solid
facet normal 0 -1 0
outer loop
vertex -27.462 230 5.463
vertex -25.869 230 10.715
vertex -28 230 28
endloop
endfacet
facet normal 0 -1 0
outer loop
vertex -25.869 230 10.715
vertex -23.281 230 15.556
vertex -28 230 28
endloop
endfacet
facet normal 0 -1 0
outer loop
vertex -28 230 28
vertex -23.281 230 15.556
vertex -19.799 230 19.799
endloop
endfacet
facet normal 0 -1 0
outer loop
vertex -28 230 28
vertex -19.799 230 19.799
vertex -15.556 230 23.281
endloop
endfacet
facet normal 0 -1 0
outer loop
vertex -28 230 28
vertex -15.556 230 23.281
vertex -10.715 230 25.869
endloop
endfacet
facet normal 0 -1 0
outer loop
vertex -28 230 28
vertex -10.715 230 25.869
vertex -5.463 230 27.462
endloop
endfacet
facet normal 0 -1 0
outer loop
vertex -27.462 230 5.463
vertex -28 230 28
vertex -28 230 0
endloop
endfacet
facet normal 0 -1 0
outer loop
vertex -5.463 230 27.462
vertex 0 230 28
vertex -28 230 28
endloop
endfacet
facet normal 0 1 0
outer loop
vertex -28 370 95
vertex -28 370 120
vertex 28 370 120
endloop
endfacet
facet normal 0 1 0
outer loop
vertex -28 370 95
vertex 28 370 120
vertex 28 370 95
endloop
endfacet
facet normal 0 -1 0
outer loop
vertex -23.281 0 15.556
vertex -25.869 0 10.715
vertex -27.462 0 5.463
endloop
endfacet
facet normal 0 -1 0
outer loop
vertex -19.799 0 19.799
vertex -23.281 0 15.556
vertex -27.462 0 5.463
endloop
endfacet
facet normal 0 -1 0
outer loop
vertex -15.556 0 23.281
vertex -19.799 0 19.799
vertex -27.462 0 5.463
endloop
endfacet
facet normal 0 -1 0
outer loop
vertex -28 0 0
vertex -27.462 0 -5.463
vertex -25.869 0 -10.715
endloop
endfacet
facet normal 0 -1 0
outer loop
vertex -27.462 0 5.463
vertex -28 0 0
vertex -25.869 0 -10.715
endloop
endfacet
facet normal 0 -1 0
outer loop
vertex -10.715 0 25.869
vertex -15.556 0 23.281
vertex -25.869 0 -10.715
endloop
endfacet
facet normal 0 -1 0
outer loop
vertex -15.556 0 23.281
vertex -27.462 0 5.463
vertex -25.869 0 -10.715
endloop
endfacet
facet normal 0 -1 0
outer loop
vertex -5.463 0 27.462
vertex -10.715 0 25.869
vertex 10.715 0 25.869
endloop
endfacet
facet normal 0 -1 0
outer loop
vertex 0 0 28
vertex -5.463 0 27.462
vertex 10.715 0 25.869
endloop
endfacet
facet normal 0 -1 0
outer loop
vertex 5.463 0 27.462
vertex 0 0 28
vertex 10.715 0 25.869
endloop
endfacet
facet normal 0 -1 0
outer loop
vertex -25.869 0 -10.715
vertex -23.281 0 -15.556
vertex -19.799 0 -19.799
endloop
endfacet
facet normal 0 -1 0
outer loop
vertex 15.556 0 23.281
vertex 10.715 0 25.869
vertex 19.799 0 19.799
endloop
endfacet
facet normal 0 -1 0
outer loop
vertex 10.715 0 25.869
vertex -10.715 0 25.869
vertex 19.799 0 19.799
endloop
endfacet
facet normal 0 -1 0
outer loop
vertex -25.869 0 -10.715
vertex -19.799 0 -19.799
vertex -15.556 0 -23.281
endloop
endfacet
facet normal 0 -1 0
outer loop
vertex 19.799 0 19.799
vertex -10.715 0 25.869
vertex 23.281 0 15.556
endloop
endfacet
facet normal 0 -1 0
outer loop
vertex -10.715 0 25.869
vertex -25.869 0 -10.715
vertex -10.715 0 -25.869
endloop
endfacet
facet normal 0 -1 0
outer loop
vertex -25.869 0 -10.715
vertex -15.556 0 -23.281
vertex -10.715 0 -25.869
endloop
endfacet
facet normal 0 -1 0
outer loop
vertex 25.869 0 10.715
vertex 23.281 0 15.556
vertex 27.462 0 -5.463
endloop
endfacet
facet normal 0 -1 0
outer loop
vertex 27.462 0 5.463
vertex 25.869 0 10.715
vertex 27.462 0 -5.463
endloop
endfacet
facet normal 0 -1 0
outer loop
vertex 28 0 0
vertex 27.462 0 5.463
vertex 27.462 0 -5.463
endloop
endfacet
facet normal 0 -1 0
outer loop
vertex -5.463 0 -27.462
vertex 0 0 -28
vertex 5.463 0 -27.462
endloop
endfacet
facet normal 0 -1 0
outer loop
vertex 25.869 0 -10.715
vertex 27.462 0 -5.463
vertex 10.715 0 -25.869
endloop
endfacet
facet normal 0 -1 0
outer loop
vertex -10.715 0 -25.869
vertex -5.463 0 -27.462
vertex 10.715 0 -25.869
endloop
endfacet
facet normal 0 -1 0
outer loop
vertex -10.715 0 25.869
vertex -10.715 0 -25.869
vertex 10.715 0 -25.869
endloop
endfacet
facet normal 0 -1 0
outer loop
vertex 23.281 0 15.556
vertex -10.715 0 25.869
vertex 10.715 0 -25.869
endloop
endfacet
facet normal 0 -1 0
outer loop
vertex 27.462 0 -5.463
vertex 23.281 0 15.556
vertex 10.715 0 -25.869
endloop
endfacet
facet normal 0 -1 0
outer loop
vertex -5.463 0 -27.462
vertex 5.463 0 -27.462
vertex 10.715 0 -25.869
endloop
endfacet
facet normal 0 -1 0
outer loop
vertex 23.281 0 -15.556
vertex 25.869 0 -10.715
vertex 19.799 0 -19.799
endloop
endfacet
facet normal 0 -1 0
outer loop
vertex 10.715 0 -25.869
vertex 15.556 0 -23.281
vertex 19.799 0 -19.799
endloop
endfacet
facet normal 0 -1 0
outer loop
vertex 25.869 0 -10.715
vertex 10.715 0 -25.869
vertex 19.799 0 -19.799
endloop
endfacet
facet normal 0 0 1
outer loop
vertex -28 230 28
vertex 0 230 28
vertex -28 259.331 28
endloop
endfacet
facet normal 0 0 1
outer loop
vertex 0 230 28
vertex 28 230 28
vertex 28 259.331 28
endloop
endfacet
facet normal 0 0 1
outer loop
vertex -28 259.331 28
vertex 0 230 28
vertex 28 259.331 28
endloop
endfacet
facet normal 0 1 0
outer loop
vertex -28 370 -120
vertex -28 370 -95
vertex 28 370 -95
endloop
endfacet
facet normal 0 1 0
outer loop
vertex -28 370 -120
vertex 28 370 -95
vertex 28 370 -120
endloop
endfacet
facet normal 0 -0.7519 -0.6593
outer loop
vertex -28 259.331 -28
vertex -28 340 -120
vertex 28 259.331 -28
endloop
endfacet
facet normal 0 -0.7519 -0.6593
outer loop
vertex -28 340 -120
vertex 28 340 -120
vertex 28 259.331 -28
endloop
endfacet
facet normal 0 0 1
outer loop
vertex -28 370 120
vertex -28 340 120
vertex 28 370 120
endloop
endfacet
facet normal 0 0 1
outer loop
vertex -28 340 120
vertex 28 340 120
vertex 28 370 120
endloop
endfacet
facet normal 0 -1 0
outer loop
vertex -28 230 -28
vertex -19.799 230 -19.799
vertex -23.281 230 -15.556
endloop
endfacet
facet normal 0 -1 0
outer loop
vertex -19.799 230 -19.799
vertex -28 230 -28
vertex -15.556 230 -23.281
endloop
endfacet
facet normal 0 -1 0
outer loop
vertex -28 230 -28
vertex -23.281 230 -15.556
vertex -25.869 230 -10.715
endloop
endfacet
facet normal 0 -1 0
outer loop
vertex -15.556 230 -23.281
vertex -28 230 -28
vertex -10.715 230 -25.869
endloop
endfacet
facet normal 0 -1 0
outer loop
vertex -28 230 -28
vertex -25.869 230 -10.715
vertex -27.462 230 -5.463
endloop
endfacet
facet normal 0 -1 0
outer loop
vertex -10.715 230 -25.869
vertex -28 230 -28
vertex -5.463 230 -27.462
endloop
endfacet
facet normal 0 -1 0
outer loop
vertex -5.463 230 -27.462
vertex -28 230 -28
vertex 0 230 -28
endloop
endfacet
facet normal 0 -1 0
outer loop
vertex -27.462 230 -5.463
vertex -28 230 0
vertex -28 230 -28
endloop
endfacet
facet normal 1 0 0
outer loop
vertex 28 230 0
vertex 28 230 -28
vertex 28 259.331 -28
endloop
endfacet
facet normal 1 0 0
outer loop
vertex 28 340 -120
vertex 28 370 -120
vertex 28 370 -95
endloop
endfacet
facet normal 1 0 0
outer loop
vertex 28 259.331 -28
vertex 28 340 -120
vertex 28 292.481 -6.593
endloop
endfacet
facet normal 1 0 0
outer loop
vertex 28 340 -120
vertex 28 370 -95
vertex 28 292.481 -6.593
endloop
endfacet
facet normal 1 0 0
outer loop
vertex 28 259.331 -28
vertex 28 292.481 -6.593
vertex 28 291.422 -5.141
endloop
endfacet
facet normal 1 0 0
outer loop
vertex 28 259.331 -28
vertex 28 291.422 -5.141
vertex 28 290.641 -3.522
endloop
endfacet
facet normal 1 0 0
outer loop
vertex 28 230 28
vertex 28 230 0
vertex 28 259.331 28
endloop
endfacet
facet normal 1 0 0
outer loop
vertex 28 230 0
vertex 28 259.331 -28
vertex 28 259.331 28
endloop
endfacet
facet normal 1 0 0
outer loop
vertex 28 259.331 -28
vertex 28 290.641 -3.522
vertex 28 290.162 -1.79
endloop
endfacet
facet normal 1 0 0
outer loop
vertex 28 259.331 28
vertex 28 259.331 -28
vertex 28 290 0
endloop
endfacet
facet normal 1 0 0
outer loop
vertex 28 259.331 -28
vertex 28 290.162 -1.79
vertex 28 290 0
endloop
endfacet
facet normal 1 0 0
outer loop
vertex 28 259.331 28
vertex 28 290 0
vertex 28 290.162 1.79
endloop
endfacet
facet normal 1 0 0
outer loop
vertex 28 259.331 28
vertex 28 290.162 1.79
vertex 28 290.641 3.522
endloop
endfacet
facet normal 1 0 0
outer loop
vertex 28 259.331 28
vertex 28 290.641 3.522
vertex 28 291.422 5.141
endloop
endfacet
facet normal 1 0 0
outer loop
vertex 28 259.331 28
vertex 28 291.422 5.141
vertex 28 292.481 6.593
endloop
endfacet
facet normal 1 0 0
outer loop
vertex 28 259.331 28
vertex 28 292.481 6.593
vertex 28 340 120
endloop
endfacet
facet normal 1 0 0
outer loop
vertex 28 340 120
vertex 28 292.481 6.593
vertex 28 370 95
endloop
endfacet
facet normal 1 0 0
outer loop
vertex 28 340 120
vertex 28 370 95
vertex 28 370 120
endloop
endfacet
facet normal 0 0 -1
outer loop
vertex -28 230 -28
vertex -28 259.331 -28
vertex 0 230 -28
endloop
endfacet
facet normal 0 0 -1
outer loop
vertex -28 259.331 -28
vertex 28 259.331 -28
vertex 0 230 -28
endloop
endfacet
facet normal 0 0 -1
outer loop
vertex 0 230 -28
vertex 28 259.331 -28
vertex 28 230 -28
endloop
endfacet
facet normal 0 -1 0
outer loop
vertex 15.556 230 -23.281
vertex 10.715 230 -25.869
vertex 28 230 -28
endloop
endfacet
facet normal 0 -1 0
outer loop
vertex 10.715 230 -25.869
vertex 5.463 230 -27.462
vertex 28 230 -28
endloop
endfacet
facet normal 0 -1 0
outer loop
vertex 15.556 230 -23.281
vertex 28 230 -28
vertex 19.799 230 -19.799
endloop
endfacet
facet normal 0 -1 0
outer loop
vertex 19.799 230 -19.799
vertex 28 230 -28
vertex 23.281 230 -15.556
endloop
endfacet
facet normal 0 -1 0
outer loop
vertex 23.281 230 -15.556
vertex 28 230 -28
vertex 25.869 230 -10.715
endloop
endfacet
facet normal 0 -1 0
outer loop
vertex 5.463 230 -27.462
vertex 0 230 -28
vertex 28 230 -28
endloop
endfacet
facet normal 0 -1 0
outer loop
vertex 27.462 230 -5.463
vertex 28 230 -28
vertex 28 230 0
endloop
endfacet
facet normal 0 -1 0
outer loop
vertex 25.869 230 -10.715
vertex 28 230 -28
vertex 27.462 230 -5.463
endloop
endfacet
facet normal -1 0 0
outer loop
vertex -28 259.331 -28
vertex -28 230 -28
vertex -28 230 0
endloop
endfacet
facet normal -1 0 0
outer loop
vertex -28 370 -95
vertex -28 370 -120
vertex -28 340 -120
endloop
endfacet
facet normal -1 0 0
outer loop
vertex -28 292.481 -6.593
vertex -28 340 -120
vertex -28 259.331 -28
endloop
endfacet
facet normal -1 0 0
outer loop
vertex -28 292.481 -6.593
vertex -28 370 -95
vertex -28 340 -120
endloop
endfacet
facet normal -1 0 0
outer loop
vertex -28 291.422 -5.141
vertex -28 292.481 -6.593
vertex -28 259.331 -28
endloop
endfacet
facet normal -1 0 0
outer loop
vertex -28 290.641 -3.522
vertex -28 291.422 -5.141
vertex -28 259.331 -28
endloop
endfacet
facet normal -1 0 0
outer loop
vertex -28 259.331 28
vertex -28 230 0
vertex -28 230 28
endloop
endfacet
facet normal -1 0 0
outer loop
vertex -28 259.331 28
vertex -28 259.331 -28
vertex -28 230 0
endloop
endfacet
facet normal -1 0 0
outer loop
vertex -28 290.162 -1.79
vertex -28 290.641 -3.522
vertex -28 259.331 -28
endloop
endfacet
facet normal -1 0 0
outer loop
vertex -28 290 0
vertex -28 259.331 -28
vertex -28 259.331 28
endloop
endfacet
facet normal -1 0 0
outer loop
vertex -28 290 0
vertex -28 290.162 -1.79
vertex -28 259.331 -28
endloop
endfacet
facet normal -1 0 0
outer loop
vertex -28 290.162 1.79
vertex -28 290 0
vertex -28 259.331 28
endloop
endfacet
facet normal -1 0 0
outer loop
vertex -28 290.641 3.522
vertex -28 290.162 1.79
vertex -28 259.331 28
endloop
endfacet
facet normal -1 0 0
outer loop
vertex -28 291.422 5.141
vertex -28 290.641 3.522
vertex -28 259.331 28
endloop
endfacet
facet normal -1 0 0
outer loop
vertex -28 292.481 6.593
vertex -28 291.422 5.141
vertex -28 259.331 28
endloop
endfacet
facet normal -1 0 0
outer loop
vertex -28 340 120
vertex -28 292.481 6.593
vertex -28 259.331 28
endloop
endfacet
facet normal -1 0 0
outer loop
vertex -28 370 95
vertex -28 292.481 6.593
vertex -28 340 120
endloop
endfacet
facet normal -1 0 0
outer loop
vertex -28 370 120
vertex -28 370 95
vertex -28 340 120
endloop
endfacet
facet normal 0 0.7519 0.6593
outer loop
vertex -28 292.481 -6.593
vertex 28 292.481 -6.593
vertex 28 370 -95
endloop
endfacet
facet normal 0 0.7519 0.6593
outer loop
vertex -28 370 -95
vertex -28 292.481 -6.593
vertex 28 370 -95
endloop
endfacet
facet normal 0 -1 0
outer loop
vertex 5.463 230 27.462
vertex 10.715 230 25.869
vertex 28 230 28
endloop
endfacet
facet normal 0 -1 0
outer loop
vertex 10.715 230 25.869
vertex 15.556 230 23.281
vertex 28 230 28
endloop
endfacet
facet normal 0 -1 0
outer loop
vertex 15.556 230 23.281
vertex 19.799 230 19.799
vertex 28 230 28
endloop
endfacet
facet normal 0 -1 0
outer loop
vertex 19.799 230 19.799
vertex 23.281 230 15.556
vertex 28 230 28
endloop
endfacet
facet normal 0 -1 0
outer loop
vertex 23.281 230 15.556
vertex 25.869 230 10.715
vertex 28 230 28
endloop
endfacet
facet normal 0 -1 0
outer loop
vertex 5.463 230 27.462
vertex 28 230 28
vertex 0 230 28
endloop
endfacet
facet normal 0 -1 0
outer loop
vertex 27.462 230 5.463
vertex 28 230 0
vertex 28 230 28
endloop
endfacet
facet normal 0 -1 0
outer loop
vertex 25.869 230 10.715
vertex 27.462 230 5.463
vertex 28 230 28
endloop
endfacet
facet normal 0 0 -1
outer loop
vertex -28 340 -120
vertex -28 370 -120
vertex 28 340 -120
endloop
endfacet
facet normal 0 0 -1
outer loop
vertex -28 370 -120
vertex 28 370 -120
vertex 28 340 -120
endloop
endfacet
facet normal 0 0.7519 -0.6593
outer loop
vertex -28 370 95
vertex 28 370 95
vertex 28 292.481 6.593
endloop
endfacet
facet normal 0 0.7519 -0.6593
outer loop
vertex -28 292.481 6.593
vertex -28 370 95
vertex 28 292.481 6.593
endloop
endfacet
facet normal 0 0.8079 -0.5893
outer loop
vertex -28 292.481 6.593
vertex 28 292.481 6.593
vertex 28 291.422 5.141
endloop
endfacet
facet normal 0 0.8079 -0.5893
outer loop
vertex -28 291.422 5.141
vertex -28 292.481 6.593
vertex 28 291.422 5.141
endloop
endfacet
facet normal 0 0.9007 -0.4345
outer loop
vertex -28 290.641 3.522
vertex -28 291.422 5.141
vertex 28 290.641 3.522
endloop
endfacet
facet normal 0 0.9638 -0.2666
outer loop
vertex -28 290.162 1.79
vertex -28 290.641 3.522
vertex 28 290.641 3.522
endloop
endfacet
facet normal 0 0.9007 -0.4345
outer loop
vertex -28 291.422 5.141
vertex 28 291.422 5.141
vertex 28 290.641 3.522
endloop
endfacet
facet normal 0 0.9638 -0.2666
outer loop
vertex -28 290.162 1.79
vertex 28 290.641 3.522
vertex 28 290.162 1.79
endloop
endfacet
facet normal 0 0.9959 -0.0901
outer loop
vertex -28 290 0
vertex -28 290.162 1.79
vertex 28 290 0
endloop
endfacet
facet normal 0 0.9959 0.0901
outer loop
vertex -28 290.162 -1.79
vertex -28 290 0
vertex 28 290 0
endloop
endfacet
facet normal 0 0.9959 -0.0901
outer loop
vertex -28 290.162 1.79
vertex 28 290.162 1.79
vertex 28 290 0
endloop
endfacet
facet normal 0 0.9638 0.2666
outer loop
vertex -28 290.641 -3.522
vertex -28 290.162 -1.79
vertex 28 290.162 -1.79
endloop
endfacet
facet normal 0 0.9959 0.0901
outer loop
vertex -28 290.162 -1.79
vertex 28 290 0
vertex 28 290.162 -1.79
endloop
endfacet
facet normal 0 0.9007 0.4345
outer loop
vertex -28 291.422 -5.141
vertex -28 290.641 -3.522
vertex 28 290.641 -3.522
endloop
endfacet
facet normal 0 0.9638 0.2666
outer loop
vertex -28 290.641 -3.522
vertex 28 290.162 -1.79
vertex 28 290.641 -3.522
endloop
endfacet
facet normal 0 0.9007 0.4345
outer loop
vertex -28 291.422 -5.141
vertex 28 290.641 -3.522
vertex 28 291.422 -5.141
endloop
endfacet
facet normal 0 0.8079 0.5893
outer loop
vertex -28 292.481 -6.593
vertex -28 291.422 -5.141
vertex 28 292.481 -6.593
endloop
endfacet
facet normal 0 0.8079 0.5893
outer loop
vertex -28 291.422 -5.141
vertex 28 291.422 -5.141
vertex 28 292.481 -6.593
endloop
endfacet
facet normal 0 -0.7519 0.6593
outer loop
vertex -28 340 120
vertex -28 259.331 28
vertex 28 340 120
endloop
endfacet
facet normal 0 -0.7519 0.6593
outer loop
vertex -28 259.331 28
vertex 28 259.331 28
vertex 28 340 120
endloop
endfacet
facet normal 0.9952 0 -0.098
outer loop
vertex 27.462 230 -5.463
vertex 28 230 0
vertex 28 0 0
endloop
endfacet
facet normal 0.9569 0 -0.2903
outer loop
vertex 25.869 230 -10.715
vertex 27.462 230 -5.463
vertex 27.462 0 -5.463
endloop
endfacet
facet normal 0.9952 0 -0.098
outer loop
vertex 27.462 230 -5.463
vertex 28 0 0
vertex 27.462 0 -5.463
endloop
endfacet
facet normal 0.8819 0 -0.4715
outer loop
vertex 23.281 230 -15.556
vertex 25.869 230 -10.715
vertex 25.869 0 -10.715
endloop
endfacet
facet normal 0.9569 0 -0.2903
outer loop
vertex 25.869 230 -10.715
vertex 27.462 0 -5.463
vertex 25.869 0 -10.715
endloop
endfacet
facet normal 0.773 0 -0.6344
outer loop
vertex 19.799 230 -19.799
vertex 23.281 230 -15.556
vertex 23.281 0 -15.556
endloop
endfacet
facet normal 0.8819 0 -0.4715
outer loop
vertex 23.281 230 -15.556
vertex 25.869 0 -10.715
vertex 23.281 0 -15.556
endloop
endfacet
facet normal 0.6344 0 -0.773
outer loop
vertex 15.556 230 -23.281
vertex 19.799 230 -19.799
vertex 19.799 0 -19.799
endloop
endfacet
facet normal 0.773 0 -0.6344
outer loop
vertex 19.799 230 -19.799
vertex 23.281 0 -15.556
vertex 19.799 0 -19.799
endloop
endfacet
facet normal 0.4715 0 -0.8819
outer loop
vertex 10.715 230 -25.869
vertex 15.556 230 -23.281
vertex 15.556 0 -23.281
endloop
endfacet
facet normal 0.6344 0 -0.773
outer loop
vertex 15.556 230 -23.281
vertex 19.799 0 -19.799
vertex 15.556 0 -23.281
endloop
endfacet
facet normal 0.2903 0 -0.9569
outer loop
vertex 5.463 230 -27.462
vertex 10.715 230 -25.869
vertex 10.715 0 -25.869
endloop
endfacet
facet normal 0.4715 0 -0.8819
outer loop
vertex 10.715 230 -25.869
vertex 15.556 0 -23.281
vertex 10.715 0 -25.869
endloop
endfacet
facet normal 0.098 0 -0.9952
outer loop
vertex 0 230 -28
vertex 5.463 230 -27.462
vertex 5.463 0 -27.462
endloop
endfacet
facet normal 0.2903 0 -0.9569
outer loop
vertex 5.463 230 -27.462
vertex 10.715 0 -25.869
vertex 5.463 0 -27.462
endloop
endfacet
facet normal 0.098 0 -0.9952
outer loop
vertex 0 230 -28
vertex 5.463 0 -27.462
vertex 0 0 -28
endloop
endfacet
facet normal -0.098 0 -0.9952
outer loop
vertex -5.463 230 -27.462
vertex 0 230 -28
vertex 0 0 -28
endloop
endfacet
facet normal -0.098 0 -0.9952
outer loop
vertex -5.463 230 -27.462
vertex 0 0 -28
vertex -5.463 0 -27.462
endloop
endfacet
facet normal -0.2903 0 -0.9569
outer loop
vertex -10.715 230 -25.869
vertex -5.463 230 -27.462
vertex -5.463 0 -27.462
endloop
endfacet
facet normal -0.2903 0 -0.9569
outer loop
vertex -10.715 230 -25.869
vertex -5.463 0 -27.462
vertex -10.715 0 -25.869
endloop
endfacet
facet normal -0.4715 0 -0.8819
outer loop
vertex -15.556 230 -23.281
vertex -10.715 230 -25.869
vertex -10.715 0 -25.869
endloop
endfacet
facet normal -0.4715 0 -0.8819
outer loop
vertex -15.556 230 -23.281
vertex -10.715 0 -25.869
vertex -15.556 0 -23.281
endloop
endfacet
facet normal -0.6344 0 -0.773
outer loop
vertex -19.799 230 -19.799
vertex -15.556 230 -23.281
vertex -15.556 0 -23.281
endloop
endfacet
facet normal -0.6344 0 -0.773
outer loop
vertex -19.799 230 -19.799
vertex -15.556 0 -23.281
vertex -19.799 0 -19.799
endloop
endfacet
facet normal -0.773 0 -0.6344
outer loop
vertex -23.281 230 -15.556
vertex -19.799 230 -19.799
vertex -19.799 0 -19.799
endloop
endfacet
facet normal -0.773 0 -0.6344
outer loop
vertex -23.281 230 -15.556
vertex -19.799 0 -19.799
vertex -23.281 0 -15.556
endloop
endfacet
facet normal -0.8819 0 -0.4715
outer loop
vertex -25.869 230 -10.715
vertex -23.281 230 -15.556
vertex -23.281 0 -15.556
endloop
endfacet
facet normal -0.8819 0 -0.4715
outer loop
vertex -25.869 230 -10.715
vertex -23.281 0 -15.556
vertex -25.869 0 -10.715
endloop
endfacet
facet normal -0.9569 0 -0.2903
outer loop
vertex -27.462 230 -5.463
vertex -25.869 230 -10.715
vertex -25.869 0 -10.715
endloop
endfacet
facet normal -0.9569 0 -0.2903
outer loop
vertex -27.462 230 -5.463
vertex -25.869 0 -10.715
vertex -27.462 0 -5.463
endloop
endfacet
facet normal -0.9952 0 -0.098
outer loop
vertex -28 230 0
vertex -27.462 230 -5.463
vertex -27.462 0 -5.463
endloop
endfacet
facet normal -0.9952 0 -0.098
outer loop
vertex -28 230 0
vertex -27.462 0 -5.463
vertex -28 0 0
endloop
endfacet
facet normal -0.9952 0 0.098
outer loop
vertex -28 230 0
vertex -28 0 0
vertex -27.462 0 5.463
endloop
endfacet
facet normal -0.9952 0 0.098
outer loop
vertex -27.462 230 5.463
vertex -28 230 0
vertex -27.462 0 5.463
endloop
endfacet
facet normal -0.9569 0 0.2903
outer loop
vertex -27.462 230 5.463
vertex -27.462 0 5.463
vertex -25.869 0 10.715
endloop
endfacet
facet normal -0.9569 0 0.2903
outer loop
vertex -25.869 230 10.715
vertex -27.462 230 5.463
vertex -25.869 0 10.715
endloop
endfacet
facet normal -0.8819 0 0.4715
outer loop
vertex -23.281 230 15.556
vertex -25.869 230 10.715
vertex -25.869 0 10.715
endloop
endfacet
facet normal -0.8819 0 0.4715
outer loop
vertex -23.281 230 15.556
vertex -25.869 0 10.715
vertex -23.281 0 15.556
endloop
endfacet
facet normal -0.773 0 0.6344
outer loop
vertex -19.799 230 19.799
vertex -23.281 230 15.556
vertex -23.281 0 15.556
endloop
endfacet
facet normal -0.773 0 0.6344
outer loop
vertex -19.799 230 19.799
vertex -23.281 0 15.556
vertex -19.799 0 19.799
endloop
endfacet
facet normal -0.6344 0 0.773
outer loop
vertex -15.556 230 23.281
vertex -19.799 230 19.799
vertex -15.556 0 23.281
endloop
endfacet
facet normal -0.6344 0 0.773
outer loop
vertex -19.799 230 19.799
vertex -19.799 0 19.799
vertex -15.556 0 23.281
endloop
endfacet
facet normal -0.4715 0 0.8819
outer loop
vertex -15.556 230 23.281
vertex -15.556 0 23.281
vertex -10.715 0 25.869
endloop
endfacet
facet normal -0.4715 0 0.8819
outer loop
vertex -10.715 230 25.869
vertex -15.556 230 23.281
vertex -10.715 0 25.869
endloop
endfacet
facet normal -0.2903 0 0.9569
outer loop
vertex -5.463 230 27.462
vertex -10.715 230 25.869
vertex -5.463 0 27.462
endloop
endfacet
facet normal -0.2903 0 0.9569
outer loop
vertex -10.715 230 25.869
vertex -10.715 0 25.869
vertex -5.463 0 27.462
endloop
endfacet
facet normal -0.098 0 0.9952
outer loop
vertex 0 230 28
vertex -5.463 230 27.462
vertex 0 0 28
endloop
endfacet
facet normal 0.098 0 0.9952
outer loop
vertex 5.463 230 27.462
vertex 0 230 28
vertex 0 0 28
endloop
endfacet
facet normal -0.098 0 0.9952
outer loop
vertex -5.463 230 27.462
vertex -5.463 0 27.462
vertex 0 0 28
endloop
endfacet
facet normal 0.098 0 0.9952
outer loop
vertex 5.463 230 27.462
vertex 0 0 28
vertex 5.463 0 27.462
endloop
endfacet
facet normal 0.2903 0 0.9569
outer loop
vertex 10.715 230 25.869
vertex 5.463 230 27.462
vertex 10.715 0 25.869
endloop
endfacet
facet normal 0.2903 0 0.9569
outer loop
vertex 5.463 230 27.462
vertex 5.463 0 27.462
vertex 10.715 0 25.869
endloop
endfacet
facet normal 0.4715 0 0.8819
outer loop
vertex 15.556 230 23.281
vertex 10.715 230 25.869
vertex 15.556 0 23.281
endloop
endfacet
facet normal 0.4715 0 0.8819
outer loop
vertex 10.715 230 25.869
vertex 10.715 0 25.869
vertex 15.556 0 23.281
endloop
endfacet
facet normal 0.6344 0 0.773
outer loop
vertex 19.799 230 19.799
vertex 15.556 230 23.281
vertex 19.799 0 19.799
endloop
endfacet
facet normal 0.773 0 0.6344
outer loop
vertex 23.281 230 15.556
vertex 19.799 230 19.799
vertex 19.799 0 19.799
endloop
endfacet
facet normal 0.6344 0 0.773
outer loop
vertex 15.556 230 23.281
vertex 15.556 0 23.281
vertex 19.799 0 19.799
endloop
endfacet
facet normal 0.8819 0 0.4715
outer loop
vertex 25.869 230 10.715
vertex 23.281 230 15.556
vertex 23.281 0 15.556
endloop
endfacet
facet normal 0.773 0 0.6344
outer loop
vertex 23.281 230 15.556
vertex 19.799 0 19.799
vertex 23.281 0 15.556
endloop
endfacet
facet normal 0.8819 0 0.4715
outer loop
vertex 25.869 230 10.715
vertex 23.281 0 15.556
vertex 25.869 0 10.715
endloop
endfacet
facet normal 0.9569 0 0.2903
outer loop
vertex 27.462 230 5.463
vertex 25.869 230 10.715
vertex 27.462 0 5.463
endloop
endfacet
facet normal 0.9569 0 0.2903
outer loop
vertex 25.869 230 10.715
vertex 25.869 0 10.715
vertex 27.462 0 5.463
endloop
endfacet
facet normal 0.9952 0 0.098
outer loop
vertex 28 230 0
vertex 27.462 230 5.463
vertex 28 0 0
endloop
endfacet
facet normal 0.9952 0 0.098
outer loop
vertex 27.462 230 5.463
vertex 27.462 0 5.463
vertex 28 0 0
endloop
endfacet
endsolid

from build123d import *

# Parameters (mm, degrees)
SKETCH1_R           = 28
BOSS_EXTRUDE1_DEPTH = 230
BOSS_EXTRUDE2_DEPTH = 28


with BuildPart() as part:
    # Sketch1 → Boss-Extrude1 (new body)
    with BuildSketch(Plane(origin=(0, 0, 0), x_dir=(1, 0, 0), z_dir=(0, 1, 0))):
        Circle(SKETCH1_R)
    extrude(amount=BOSS_EXTRUDE1_DEPTH)

    # Sketch2 → Boss-Extrude2 (add, symmetric)
    with BuildSketch(Plane(origin=(0, 0, 0), x_dir=(0, 0, -1), z_dir=(1, 0, 0))):
        with BuildLine():
            Line((6.592878428, 292.481093562), (95, 370))
            Line((95, 370), (120, 370))
            Line((120, 370), (120, 340))
            Line((120, 340), (28, 259.330713798))
            Line((28, 259.330713798), (28, 230))
            Line((28, 230), (-28, 230))
            Line((-28, 230), (-28, 259.330713798))
            Line((-28, 259.330713798), (-120, 340))
            Line((-120, 340), (-120, 370))
            Line((-120, 370), (-95, 370))
            Line((-95, 370), (-6.592878428, 292.481093562))
            ThreePointArc((-6.592878428, 292.481093562), (0, 290), (6.592878428, 292.481093562))
        make_face()
    extrude(amount=BOSS_EXTRUDE2_DEPTH, both=True)


solid = part.part
